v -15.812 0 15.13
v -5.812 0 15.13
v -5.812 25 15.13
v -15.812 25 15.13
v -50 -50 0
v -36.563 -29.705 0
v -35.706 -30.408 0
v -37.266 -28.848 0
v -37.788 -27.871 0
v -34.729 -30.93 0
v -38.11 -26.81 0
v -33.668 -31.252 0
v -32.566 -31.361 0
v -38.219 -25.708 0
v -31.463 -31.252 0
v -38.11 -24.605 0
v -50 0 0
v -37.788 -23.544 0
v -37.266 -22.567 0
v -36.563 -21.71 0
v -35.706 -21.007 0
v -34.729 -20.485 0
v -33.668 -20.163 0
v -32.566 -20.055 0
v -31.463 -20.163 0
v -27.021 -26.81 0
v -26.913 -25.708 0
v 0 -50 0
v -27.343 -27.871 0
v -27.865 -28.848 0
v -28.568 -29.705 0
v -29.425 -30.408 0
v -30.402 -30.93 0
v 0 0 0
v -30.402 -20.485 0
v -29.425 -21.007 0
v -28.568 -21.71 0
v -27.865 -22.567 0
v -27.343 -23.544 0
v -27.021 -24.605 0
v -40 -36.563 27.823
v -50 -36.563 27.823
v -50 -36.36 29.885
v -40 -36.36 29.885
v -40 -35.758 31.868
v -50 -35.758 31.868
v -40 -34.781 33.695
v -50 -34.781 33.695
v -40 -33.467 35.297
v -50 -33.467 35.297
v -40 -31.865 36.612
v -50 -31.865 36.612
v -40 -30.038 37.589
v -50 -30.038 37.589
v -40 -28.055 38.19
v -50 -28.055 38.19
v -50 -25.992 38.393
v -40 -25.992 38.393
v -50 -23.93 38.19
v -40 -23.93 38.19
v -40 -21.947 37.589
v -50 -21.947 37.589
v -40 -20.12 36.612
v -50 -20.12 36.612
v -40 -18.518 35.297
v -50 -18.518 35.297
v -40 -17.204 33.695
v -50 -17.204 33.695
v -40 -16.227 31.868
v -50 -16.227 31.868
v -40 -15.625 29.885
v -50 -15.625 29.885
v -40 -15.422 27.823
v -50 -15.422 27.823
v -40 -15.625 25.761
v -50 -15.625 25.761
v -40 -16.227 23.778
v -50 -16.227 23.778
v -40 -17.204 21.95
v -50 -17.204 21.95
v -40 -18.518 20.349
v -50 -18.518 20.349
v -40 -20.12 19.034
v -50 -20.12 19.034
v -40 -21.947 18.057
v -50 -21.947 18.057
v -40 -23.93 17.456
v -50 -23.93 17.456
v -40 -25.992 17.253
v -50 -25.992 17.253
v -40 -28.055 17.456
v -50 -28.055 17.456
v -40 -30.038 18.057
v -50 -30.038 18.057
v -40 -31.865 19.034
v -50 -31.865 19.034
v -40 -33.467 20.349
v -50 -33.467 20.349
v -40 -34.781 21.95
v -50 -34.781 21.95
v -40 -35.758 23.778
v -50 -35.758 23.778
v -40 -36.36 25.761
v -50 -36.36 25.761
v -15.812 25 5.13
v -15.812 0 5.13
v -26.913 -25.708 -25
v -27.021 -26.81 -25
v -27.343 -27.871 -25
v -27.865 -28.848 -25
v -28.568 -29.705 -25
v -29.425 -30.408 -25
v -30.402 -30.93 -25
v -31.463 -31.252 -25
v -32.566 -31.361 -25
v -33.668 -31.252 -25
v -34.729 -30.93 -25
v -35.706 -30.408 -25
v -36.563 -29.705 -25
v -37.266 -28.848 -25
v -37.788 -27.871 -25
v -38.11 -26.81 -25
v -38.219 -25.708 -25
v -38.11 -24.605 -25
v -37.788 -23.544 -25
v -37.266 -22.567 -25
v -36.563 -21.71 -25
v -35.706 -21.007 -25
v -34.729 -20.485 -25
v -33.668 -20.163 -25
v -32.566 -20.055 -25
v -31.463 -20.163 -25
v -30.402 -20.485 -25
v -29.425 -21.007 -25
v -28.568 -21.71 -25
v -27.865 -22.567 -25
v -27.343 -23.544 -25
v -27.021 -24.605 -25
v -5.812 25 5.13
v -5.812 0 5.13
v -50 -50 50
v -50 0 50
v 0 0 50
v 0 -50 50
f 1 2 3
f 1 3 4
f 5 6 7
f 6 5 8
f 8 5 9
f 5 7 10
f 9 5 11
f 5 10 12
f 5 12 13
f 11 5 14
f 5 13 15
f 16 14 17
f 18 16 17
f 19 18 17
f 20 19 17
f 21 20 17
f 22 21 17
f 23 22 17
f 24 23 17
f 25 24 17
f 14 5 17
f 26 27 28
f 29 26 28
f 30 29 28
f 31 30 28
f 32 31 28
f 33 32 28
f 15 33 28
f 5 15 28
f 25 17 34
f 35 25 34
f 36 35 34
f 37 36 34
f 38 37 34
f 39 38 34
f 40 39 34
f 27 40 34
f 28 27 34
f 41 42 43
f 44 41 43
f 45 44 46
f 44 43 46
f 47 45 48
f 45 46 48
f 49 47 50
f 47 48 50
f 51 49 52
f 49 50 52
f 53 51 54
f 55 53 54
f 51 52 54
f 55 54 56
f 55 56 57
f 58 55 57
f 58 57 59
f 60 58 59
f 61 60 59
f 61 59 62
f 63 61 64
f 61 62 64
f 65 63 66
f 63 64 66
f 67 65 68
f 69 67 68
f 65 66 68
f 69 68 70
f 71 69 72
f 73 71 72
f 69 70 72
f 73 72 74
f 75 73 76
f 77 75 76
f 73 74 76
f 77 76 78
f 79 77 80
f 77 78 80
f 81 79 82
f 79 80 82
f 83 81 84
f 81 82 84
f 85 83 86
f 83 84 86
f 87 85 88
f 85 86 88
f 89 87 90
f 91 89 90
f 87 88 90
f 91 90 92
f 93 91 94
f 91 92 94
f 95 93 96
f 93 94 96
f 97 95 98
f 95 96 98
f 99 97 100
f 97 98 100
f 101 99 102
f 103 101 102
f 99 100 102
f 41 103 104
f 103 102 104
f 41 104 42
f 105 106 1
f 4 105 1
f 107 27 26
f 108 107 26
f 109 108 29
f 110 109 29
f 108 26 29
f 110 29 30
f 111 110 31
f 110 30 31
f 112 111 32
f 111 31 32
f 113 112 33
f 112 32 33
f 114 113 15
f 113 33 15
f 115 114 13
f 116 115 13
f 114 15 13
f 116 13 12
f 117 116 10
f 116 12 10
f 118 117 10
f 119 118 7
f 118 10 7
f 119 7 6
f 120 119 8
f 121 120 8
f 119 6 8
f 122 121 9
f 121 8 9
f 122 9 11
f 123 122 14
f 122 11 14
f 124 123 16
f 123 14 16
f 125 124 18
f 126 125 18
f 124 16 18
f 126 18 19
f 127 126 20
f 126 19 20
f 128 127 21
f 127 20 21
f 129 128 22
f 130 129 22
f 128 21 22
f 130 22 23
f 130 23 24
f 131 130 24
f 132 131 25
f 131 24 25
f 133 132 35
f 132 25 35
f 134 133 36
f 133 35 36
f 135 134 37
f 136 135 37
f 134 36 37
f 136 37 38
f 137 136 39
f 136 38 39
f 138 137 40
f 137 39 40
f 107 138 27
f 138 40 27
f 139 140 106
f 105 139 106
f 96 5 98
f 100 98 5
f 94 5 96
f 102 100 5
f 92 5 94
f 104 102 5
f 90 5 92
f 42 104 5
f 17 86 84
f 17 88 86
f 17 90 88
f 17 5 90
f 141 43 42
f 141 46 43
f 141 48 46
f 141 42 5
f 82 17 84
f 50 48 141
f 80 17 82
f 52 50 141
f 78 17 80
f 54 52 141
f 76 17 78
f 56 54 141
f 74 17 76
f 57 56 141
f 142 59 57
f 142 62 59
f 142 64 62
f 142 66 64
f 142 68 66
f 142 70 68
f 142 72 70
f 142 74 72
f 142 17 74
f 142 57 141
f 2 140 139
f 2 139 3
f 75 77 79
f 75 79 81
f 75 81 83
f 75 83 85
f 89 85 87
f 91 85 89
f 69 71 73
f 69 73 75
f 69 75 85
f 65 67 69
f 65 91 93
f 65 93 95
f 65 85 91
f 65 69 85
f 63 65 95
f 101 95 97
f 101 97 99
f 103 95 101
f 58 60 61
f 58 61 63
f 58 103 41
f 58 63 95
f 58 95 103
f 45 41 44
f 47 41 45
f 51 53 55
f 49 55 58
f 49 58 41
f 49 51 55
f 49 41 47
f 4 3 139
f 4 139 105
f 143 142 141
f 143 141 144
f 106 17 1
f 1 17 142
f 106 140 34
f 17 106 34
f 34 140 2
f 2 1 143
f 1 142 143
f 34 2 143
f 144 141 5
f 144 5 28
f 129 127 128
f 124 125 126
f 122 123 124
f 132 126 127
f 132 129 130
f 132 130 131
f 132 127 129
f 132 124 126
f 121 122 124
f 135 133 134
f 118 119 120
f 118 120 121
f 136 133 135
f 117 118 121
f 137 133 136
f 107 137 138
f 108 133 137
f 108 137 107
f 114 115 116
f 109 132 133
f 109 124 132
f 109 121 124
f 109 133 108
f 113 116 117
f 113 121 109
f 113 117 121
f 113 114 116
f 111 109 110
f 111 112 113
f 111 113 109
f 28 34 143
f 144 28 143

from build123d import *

# Parameters (mm, degrees)
F0_W     = 50
F0_H     = 50
F1_DEPTH = 50
F2_R     = 5.653003
F3_DEPTH = 25
F4_R     = 10.570293
F5_DEPTH = 10
F6_W     = 10
F6_H     = 10
F7_DEPTH = 25


with BuildPart() as f1:
    # F0 (on Front) → F1 (new body)
    with BuildSketch(Plane.XZ):
        with Locations((-25, 25)):
            Rectangle(F0_W, F0_H)
    extrude(amount=F1_DEPTH)

    # F2 (on face) → F3 (join)
    with BuildSketch(Plane(origin=(0, 0, 0), x_dir=(1, 0, 0), z_dir=(0, 0, -1))):
        with Locations((-32.565601, 25.707576)):
            Circle(F2_R)
    extrude(amount=F3_DEPTH)

    # F4 (on face) → F5 (cut)
    with BuildSketch(Plane(origin=(-50, 0, 0), x_dir=(0, -1, 0), z_dir=(-1, 0, 0))):
        with Locations((25.992477, 27.822873)):
            Circle(F4_R)
    extrude(amount=-F5_DEPTH, mode=Mode.SUBTRACT)

    # F6 (on face) → F7 (join)
    with BuildSketch(Plane(origin=(0, 0, 0), x_dir=(-1, 0, 0), z_dir=(0, 1, 0))):
        with Locations((10.811531, 10.130358)):
            Rectangle(F6_W, F6_H)
    extrude(amount=F7_DEPTH)


solid = f1.part
